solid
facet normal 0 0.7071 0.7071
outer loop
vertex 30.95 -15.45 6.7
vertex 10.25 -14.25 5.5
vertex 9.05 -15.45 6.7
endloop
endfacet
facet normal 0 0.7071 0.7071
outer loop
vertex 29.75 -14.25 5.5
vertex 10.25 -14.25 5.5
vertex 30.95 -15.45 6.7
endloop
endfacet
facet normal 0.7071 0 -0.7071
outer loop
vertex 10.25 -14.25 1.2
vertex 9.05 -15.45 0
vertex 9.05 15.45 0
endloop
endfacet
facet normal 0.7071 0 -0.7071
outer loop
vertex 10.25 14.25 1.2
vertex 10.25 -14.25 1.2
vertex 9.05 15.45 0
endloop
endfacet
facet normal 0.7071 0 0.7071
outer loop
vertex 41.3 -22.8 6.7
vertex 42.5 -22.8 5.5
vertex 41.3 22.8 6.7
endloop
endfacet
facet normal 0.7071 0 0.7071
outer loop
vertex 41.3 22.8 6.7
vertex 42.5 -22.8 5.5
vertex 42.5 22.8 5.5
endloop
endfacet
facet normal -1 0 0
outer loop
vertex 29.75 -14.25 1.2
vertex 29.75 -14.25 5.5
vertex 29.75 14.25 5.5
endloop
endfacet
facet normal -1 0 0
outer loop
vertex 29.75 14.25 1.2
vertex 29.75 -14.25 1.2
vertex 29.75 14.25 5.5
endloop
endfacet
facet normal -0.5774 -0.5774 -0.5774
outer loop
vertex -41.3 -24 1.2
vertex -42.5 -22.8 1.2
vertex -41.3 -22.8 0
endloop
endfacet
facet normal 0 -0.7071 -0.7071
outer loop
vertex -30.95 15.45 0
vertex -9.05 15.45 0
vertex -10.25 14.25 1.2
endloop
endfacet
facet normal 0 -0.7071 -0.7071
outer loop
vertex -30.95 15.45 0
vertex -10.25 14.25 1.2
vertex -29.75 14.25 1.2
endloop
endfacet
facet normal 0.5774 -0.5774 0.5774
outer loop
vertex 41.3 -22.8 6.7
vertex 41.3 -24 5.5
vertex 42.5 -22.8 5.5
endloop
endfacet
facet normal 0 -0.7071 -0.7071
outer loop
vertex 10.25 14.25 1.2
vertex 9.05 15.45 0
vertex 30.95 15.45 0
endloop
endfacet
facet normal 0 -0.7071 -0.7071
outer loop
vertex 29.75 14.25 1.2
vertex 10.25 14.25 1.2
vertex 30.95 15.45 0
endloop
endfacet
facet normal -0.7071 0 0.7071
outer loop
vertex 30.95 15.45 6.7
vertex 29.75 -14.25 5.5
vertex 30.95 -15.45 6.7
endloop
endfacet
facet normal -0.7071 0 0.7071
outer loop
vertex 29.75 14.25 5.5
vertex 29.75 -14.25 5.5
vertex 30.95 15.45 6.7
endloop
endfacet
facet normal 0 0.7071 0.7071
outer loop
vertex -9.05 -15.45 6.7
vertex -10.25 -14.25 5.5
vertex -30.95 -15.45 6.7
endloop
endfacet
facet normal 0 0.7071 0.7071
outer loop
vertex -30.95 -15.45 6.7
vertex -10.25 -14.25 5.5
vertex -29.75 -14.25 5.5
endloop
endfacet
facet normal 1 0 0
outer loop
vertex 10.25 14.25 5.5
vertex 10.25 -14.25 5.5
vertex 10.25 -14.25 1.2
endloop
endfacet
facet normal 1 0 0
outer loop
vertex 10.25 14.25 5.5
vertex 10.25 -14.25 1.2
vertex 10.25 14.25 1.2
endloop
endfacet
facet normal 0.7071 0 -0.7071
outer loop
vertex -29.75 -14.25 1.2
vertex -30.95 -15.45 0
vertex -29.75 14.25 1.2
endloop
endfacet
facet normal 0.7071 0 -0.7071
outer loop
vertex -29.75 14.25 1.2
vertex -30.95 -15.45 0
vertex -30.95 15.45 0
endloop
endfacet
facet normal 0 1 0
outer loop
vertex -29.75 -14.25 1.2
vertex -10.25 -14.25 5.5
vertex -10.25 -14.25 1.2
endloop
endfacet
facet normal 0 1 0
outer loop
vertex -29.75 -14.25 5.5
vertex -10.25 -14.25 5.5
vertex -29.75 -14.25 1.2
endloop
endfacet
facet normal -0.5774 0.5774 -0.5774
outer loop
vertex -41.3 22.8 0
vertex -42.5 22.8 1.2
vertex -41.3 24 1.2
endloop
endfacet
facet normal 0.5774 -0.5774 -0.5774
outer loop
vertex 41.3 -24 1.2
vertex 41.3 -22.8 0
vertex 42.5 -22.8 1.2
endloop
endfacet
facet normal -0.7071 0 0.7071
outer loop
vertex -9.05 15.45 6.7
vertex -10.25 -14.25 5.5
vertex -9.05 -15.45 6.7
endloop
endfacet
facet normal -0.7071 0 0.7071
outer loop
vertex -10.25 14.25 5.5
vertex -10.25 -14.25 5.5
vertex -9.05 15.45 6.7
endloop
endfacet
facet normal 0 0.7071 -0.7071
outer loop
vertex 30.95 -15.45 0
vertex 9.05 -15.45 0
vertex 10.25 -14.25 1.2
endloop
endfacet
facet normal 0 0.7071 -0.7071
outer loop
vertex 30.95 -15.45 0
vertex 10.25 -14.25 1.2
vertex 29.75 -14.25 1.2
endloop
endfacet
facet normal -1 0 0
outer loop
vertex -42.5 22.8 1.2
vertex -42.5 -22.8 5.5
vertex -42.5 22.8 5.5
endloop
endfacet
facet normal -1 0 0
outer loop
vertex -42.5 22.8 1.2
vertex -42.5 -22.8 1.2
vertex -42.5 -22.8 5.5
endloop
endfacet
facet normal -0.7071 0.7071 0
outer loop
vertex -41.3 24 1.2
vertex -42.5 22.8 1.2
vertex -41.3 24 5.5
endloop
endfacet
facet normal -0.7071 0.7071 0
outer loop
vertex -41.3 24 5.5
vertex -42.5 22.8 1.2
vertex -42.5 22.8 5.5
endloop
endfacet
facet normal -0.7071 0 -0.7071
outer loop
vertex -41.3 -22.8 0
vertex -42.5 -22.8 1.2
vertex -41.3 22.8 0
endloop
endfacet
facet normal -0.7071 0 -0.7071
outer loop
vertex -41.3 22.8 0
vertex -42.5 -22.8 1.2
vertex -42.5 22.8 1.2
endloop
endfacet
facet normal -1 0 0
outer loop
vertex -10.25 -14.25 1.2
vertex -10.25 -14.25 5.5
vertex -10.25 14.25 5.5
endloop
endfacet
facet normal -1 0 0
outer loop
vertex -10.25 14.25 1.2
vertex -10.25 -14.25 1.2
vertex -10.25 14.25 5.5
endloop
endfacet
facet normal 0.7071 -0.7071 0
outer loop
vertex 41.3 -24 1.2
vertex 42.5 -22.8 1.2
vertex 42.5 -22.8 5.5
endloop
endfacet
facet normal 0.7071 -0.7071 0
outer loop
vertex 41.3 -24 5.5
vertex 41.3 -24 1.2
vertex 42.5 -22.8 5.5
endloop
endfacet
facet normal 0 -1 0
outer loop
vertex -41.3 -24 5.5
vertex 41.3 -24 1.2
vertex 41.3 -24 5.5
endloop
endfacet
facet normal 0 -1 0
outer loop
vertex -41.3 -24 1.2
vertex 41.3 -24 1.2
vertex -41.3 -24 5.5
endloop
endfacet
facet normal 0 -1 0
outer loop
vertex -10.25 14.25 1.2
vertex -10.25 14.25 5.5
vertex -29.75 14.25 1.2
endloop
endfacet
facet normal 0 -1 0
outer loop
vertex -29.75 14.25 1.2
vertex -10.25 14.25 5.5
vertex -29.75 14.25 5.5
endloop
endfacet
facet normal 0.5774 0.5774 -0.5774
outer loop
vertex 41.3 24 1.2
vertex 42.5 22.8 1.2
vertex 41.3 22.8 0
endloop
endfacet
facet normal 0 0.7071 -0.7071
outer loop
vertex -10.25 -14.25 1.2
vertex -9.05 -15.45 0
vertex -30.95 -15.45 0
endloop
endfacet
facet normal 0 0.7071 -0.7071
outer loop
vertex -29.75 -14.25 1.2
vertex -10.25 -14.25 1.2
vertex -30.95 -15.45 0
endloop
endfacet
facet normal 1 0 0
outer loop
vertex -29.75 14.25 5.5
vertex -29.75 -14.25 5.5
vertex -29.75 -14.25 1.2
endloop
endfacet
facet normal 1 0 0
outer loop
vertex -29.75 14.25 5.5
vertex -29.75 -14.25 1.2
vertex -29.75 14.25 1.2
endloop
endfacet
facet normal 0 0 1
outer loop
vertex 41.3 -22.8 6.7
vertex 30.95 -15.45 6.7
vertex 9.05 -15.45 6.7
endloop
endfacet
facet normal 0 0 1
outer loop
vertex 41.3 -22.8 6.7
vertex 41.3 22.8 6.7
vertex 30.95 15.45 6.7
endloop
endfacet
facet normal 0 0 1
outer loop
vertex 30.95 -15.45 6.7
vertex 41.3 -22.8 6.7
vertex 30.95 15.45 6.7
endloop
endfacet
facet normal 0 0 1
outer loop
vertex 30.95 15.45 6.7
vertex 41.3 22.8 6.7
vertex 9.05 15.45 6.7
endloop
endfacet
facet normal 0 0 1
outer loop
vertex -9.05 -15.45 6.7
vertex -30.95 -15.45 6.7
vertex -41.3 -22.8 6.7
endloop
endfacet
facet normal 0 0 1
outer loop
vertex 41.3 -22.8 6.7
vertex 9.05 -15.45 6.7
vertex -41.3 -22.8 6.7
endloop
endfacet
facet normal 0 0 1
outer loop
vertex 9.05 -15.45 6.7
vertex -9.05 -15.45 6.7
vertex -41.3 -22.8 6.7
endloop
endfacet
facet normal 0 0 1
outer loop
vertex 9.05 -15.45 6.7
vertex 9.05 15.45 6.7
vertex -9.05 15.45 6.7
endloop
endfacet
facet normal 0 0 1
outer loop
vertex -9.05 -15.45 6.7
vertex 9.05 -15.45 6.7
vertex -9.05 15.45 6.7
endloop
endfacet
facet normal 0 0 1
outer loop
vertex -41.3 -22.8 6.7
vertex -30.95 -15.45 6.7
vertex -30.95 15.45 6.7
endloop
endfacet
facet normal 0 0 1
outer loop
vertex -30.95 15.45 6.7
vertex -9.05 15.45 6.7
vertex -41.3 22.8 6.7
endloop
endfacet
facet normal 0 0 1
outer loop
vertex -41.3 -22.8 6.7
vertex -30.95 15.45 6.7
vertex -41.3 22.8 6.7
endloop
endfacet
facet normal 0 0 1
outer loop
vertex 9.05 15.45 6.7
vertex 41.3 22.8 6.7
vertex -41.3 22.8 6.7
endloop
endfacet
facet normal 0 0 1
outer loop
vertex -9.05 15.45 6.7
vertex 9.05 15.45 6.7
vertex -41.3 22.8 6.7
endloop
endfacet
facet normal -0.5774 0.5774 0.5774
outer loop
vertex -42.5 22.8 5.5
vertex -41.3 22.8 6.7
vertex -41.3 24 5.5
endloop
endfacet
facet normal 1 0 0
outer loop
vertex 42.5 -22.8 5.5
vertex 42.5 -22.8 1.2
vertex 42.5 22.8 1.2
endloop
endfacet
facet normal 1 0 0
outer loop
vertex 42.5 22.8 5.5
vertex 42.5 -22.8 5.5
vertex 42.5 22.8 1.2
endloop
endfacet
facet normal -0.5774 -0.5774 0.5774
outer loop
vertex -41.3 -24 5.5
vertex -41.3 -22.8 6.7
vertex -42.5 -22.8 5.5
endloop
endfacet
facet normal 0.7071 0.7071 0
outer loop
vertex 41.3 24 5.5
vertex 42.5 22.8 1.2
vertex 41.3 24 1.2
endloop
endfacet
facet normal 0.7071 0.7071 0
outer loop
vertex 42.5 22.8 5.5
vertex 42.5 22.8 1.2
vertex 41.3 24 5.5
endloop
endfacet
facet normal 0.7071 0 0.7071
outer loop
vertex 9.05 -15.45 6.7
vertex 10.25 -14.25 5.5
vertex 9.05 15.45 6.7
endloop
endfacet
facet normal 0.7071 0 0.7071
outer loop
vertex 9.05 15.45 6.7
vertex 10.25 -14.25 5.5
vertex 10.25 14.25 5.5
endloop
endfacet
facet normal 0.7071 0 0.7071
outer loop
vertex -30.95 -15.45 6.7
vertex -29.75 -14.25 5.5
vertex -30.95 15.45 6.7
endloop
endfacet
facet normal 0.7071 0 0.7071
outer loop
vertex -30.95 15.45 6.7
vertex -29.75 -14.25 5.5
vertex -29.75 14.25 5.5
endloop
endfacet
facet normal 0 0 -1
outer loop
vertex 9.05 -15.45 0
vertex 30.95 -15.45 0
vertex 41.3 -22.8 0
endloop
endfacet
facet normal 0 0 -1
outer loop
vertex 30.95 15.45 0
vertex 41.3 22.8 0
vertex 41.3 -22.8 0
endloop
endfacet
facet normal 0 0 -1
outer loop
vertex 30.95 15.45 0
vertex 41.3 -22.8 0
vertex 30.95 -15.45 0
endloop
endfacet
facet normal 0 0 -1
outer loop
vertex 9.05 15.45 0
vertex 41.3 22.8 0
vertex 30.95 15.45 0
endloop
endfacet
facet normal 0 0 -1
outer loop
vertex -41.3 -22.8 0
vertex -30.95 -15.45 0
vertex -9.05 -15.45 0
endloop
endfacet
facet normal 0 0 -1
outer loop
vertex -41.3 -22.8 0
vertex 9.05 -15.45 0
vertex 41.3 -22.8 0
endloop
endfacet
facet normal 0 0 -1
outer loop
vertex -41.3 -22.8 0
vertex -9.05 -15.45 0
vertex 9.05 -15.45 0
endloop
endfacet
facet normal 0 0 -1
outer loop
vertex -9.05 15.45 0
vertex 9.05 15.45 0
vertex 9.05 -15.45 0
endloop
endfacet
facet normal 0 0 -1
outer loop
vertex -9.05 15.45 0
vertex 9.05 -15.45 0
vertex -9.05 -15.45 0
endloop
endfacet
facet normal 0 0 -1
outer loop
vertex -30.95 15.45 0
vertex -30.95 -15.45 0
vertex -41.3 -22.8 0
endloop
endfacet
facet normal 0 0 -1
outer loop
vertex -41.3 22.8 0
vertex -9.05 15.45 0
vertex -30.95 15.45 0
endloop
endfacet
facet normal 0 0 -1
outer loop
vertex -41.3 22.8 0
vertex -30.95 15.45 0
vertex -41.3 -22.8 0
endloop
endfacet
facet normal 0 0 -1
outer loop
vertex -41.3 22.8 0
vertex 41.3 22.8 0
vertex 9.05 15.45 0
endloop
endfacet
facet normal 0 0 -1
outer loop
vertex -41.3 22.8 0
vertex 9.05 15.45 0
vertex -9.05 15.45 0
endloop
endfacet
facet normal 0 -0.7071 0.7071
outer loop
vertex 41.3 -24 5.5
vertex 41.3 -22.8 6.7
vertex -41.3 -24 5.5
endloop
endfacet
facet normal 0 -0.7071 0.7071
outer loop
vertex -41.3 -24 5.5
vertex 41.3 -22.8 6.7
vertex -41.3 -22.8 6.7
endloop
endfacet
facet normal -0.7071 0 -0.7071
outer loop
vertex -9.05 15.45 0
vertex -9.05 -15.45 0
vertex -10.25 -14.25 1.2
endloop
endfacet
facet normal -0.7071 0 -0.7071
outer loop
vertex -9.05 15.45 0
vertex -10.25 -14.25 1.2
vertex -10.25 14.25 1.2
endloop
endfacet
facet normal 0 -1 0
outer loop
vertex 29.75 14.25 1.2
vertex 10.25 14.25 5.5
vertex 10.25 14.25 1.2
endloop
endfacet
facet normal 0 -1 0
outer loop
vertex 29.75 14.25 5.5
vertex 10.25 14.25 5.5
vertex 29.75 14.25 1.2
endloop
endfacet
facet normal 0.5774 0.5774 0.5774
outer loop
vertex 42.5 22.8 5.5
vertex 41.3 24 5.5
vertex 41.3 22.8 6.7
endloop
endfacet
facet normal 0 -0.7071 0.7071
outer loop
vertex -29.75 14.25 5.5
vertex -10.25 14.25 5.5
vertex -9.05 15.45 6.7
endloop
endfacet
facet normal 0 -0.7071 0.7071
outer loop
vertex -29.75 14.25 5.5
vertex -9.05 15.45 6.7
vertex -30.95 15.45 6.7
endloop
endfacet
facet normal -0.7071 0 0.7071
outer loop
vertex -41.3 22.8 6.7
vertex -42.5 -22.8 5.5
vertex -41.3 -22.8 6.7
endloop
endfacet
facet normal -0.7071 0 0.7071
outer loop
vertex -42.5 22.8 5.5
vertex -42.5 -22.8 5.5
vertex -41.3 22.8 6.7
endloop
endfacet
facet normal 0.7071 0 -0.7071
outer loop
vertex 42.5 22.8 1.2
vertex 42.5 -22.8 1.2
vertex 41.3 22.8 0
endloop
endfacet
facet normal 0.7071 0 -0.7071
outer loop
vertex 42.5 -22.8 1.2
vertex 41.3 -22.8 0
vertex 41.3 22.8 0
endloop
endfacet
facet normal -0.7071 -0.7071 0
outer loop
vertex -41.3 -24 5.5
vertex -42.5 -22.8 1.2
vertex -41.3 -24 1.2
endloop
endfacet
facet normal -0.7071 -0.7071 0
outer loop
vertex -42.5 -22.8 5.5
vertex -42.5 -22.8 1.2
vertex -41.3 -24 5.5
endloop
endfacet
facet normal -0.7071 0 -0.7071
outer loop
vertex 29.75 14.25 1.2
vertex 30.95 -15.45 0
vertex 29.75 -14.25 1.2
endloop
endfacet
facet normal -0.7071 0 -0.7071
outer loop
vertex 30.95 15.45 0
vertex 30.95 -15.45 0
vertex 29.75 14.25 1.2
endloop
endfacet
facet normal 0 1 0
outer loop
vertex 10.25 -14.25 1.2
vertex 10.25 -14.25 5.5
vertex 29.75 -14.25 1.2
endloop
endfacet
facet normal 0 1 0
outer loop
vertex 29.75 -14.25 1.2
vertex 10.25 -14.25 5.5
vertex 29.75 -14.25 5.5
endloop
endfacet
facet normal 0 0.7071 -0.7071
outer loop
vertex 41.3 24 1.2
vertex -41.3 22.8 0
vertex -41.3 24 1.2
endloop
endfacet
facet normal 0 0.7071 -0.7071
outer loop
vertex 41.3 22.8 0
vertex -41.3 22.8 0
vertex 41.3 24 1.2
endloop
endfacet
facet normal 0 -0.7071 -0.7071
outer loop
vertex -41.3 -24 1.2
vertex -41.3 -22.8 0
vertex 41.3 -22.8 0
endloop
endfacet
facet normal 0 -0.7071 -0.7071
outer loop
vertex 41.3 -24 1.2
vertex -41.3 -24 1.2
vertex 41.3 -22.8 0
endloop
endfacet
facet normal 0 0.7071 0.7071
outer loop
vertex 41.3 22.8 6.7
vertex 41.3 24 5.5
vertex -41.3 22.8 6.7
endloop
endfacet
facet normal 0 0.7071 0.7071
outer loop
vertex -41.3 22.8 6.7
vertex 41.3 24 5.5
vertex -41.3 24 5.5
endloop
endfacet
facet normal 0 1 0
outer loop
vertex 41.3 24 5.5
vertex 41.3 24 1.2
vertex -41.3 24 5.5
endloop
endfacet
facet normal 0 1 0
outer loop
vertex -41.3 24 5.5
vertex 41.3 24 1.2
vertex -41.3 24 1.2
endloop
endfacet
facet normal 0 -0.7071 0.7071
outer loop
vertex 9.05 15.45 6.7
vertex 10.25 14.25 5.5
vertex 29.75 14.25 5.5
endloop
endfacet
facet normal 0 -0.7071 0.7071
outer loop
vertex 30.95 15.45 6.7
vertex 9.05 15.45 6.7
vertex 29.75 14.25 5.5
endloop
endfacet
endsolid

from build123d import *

# Parameters (mm, degrees)
F0_W     = 42.5
F0_H     = 48
F1_DEPTH = 6.7
F2_W     = 19.5
F2_H     = 28.5
F3_DEPTH = 25
F5_SIZE  = 1.2


with BuildPart() as f1:
    # F0 (on Top) → F1 (new body)
    with BuildSketch(Plane.XY):
        with Locations((21.25, 0)):
            Rectangle(F0_W, F0_H)
    extrude(amount=F1_DEPTH)

    # F2 (on face) → F3 (cut)
    with BuildSketch(Plane.XY.offset(6.7)):
        with Locations((20, 0)):
            Rectangle(F2_W, F2_H)
    extrude(amount=-F3_DEPTH, mode=Mode.SUBTRACT)

    # F4: F1 across plane


with BuildPart() as f1_1:
    add(f1.part)
    add(f1.part.mirror(Plane.YZ))

    # F5
    f5_edges = [f1_1.edges().sort_by_distance(p)[0] for p in [
        (0, 24, 6.7),
        (-42.5, 0, 6.7),
        (0, -24, 6.7),
        (42.5, 0, 0),
        (29.75, 0, 6.7),
        (10.25, 0, 6.7),
        (-10.25, 0, 6.7),
        (-29.75, 0, 6.7),
        (-20, 14.25, 6.7),
        (-20, -14.25, 6.7),
        (20, -14.25, 6.7),
        (20, 14.25, 6.7),
        (-42.5, -24, 3.35),
        (-42.5, 0, 0),
        (-42.5, 24, 3.35),
        (0, -24, 0),
        (-20, -14.25, 0),
        (-10.25, 0, 0),
        (-20, 14.25, 0),
        (-29.75, 0, 0),
        (10.25, 0, 0),
        (29.75, 0, 0),
        (20, 14.25, 0),
        (20, -14.25, 0),
        (42.5, 24, 3.35),
        (42.5, -24, 3.35),
        (42.5, 0, 6.7),
        (0, 24, 0),
    ]]
    chamfer(f5_edges, length=F5_SIZE)


solid = f1_1.part
